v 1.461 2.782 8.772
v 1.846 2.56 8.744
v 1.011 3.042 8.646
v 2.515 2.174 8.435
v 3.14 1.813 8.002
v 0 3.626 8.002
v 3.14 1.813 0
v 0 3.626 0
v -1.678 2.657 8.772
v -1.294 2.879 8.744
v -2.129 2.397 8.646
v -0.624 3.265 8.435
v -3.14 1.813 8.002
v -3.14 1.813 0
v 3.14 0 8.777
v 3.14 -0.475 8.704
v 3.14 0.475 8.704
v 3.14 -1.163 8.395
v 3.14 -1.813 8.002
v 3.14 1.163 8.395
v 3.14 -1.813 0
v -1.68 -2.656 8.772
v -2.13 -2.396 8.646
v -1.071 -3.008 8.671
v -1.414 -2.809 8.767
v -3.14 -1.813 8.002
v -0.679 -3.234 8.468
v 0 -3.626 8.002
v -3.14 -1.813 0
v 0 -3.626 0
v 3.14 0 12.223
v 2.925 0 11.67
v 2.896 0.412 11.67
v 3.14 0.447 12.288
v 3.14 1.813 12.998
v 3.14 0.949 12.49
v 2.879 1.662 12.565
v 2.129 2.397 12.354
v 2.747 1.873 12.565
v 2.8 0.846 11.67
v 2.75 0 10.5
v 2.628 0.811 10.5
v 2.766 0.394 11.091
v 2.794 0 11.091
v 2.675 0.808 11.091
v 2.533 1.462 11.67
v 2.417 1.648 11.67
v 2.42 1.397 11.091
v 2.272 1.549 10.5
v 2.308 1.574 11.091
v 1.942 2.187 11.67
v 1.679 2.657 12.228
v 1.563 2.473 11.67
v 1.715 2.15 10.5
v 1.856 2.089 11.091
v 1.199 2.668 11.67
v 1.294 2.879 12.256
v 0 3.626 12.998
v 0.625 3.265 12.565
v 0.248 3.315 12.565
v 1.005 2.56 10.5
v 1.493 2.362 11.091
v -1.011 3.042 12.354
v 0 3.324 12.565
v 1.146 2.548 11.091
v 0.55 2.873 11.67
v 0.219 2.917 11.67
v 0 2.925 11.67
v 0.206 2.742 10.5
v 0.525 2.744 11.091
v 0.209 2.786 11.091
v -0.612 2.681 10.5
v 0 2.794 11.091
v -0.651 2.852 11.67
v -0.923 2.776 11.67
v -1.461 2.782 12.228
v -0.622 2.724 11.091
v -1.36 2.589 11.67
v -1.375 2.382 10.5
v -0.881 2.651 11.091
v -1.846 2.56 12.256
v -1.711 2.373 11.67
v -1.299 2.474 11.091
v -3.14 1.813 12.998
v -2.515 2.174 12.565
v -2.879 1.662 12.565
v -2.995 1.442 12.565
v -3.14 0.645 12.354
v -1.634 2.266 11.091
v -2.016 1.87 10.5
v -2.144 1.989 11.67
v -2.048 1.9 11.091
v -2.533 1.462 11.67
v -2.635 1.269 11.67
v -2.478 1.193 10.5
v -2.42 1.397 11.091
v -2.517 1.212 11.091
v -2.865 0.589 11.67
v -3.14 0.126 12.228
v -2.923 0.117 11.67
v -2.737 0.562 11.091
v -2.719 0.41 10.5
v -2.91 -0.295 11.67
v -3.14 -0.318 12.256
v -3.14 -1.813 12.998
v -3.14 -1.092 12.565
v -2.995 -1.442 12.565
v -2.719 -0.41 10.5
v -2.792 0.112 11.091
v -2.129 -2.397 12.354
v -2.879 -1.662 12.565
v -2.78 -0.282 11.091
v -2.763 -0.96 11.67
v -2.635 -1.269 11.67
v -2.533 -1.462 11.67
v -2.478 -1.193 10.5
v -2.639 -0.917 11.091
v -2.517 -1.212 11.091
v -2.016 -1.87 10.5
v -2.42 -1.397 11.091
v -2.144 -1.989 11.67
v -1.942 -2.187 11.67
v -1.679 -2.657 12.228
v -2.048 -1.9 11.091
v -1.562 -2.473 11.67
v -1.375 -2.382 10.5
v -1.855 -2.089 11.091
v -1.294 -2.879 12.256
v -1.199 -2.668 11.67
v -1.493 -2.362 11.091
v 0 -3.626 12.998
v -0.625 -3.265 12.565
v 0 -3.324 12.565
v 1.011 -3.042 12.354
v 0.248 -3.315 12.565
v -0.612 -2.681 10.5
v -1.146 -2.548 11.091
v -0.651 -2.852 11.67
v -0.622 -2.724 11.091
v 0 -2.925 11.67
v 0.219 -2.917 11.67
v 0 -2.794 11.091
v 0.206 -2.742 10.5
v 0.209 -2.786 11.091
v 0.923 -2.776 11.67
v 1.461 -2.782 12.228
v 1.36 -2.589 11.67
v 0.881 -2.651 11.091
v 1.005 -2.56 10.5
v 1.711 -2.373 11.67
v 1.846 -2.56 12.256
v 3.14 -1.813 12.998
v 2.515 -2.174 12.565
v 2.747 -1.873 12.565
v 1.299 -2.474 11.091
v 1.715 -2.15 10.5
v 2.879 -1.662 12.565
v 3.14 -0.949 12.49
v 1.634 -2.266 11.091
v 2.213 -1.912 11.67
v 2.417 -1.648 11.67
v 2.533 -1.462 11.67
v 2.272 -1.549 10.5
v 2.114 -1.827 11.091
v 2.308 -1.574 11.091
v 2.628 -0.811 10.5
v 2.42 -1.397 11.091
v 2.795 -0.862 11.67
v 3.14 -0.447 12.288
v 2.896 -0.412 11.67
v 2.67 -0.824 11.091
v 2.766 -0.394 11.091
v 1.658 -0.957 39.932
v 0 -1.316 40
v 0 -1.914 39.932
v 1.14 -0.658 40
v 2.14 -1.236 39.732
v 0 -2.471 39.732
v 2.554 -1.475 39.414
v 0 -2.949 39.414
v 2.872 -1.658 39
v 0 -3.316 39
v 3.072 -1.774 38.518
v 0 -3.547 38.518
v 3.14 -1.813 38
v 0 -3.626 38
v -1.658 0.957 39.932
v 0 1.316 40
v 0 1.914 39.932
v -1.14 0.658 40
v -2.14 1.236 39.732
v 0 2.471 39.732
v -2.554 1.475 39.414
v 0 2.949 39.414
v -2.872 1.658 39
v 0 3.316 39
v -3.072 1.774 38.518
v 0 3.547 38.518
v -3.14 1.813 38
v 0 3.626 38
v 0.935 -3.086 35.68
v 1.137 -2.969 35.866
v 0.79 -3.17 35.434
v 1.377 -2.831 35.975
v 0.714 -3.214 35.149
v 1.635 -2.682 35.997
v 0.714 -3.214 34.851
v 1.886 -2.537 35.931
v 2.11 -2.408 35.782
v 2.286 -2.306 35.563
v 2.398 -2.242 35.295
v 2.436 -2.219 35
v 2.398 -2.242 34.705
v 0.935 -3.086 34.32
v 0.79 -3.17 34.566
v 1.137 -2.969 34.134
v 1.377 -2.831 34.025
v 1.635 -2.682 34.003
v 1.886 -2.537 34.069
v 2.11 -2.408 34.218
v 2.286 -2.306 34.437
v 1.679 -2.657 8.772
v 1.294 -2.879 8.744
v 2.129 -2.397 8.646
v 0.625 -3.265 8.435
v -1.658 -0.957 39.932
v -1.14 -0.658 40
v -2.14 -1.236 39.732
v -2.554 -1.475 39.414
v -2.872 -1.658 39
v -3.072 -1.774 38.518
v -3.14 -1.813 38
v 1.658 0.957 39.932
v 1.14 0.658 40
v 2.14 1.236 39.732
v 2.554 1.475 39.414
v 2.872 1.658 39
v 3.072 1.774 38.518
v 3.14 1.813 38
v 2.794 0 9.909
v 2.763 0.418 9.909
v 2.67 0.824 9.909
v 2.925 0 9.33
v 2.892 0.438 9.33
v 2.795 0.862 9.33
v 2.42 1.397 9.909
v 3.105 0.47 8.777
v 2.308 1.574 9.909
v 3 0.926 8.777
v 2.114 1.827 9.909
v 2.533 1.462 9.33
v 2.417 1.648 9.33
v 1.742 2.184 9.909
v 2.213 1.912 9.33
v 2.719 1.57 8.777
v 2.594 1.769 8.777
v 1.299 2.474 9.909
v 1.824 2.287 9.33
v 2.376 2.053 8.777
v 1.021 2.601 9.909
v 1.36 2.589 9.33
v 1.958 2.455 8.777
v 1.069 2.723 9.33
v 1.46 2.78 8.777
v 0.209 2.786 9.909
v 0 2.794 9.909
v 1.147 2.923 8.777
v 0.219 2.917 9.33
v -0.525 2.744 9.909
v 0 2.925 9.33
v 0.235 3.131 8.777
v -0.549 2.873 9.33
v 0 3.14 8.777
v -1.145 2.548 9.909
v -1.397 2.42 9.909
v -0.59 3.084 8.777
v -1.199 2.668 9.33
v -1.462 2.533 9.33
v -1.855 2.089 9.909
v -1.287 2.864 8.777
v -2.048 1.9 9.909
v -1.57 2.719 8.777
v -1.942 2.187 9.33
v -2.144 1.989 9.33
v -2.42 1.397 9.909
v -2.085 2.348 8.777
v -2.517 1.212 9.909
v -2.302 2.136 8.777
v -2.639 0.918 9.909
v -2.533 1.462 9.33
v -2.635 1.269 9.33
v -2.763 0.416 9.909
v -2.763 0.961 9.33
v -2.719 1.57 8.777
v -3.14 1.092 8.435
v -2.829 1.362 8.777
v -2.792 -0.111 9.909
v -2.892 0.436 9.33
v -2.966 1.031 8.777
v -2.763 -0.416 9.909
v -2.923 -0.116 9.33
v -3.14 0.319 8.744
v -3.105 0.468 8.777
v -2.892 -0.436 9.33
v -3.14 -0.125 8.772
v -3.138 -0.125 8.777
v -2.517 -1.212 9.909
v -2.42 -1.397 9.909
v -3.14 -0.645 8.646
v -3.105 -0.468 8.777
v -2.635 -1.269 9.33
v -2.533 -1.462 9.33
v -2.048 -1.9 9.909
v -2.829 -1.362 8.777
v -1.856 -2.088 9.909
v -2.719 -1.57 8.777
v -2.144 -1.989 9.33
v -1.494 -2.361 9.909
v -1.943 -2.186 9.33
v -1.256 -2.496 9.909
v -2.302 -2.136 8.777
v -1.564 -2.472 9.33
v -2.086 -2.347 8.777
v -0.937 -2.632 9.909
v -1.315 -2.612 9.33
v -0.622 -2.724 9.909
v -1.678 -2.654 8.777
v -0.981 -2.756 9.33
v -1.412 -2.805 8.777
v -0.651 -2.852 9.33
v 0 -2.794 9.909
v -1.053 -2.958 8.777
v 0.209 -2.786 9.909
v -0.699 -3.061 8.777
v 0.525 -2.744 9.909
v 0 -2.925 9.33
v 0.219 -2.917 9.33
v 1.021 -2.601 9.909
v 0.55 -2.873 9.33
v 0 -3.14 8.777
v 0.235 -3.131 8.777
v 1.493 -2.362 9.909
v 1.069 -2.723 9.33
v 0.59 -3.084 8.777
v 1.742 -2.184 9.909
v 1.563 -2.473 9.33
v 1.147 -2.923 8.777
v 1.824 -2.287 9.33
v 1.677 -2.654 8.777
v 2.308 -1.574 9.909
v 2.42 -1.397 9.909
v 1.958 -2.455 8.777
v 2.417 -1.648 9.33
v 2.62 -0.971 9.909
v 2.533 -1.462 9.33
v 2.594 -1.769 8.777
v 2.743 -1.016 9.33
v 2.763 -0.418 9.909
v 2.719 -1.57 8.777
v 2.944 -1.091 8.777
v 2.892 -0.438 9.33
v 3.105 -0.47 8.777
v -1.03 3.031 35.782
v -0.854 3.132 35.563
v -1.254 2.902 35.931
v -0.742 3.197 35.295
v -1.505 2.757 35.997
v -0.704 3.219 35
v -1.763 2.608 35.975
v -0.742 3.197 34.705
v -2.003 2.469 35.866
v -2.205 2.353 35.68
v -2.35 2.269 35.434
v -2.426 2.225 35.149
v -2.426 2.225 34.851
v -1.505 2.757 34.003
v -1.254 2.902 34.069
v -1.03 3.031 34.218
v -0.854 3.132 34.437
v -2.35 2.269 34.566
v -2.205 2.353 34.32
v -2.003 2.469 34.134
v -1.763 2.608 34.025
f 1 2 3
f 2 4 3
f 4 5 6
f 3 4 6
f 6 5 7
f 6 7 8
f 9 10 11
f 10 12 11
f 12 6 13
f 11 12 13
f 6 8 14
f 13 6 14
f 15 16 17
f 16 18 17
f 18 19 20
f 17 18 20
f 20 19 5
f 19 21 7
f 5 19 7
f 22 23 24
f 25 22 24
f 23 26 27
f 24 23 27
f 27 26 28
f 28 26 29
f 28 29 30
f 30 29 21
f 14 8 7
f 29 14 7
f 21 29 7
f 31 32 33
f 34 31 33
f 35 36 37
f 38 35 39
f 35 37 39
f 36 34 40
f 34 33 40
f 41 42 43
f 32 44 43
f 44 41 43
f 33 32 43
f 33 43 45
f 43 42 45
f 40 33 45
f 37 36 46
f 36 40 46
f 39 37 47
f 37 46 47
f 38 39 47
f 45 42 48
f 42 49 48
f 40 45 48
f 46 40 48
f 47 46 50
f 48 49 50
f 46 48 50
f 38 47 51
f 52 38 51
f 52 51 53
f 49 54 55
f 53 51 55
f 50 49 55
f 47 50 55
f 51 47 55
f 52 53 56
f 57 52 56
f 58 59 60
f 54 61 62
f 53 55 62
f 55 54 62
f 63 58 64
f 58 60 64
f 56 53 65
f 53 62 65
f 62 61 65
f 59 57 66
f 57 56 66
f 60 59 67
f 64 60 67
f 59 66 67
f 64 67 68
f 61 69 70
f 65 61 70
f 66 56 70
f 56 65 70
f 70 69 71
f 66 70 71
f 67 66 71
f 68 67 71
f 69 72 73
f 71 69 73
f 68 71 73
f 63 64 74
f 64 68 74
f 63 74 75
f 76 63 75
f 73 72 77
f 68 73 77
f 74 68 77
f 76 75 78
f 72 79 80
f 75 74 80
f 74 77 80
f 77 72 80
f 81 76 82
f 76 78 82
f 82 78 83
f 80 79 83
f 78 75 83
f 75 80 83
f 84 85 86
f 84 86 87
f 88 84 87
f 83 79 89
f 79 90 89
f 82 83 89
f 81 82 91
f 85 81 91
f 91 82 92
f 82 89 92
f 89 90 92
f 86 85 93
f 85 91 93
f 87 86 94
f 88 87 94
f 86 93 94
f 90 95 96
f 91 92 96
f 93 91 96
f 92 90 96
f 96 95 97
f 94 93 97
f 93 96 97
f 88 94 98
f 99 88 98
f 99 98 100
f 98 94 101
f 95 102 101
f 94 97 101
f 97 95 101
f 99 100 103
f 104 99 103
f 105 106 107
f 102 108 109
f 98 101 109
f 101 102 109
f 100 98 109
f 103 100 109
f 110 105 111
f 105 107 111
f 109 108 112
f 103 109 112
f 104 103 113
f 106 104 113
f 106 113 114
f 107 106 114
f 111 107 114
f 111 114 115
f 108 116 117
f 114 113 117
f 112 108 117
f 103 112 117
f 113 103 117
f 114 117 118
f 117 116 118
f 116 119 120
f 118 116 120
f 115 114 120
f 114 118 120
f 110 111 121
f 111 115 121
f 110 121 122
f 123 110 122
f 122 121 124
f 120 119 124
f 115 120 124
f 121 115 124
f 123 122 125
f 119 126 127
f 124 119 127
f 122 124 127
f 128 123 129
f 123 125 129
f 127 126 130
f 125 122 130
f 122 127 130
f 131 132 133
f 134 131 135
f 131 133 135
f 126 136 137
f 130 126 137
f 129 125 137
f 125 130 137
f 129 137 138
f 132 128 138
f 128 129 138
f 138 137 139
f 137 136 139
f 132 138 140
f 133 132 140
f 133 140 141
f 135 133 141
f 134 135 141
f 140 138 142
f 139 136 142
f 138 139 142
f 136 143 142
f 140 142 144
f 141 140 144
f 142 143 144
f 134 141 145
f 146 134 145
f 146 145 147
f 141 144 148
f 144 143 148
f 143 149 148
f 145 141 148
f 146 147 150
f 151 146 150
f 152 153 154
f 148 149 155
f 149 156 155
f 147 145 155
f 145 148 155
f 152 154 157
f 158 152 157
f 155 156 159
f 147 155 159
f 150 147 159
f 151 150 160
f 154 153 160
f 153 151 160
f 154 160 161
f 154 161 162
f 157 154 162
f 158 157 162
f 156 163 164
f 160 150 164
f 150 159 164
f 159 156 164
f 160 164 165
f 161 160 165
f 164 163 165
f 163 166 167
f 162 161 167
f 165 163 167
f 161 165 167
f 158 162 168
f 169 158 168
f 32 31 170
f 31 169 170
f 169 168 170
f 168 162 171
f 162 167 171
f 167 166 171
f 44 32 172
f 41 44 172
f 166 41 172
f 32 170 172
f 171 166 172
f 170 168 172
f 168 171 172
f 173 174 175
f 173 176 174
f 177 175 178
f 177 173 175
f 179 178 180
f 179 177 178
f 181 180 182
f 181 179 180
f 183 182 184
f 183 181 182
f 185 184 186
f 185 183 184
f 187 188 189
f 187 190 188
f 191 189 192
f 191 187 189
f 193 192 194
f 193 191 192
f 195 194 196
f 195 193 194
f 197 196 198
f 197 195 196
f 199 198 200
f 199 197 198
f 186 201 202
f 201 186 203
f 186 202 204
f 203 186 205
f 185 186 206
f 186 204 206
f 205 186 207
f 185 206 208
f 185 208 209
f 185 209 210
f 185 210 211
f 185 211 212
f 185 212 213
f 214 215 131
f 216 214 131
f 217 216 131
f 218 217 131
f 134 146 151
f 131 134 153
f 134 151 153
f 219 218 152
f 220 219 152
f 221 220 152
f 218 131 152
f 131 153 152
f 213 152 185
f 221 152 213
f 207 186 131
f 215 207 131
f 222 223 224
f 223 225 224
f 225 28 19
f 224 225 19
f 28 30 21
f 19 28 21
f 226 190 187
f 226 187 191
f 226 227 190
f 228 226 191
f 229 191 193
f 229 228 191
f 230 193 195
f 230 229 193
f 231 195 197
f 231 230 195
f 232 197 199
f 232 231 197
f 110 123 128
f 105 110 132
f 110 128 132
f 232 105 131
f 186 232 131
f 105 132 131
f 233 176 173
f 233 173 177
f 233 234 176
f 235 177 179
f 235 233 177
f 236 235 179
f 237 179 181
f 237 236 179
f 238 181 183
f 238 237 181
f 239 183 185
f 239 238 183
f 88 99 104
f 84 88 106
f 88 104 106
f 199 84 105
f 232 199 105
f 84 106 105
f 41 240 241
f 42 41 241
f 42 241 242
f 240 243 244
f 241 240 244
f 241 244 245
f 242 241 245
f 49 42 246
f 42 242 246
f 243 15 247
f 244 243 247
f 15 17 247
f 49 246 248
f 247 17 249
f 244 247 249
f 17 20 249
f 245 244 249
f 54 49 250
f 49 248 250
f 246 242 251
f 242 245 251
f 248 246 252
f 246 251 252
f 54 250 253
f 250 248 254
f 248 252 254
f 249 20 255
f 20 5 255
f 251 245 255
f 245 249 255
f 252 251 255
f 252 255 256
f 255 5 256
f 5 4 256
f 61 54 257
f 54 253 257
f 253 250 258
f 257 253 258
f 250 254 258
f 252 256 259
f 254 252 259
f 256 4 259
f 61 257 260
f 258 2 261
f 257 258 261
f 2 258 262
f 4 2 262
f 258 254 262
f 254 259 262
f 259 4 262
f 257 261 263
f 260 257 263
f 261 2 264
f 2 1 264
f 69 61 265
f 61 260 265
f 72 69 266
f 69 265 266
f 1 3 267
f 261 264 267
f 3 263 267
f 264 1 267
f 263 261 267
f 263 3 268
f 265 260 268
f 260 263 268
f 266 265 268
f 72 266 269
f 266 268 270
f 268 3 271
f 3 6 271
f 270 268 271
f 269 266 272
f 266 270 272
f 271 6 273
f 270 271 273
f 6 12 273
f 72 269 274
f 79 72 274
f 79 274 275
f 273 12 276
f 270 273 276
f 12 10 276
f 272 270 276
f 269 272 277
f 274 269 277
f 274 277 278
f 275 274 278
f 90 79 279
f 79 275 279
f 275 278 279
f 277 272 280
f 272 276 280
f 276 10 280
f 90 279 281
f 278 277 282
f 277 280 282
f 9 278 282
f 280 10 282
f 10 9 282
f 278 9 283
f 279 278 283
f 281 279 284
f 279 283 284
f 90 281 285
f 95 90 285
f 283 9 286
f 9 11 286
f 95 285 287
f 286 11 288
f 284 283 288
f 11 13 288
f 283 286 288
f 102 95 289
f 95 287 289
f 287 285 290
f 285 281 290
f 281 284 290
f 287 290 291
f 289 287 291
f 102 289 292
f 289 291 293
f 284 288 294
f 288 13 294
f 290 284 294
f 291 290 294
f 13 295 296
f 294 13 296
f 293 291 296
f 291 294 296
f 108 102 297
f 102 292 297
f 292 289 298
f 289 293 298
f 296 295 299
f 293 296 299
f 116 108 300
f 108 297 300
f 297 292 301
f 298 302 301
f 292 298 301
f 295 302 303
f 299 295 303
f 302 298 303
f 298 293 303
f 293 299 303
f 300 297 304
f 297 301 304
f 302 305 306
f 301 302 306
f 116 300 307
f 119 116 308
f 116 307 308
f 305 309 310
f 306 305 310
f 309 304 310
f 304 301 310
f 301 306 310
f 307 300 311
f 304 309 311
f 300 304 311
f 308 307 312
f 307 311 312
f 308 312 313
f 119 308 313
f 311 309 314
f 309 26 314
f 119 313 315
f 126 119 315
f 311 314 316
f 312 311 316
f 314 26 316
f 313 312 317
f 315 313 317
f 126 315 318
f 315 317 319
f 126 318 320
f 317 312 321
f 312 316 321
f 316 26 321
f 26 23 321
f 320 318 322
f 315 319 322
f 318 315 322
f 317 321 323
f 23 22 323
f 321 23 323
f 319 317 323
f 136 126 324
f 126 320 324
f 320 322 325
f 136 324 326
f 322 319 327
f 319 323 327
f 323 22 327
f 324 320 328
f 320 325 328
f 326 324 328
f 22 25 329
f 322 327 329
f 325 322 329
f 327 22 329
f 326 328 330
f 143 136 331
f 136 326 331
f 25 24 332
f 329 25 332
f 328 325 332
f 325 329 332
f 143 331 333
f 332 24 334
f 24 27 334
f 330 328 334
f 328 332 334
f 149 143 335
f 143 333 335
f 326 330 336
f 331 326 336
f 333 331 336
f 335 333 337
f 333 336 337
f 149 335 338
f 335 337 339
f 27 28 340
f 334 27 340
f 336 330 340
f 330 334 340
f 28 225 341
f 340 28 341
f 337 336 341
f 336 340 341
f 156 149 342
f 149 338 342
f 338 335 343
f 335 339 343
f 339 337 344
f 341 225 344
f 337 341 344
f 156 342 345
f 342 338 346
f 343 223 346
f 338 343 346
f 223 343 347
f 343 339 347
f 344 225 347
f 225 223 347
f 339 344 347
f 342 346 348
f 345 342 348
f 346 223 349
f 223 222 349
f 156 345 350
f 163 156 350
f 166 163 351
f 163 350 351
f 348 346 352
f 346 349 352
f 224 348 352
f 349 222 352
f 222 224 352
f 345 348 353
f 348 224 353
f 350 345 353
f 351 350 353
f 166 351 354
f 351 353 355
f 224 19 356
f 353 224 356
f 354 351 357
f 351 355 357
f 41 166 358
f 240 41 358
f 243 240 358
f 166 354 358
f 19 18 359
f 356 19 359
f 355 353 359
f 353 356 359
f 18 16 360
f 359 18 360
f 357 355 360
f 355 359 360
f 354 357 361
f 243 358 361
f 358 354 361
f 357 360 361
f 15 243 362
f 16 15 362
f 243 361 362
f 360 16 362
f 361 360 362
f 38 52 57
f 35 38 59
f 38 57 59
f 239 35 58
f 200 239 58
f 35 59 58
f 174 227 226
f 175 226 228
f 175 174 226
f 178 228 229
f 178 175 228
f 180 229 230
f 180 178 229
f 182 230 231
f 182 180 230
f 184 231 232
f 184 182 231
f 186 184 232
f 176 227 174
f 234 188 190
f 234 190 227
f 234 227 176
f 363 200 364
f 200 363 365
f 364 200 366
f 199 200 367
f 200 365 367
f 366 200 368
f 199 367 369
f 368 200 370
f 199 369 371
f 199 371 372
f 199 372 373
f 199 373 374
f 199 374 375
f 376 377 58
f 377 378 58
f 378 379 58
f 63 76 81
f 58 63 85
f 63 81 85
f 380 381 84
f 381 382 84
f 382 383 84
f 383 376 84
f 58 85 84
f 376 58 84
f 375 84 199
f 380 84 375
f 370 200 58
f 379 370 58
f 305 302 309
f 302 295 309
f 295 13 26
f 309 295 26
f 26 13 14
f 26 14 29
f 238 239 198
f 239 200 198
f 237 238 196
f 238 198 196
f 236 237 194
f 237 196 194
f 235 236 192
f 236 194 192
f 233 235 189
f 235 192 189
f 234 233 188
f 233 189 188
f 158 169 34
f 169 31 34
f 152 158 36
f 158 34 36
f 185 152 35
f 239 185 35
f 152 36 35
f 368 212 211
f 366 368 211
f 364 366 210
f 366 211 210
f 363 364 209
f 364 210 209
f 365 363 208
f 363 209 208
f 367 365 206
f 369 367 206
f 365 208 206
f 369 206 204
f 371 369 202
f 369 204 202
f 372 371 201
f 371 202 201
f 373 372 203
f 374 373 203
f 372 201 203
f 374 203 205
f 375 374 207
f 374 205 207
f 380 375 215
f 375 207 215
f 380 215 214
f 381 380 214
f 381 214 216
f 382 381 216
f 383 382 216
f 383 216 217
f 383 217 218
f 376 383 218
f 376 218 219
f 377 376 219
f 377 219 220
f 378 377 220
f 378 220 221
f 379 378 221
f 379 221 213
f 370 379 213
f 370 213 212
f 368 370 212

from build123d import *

# Parameters (mm, degrees)
F1_DEPTH = 40
F2_R     = 1
F3_DEPTH = 7.851
F6_R     = 4
F8_R     = 2


with BuildPart() as f1:
    # F0 (on Top) → F1 (new body)
    with BuildSketch(Plane.XY):
        Polygon((0, 3.62576), (-3.14, 1.81288), (-3.14, -1.81288), (0, -3.62576), (3.14, -1.81288), (3.14, 1.81288), align=None)
    extrude(amount=F1_DEPTH)

    # F2 (on face) → F3 (cut, through all)
    with BuildSketch(Plane(origin=(1.57, -2.71932, 0), x_dir=(0.866025, 0.5, 0), z_dir=(0.5, -0.866025, 0))):
        with Locations((0, 35)):
            Circle(F2_R)
    extrude(amount=-F3_DEPTH, mode=Mode.SUBTRACT)

    # F7: sweep along a path in F5
    with BuildLine(Plane.XY.offset(10.5)) as f7_path:
        CenterArc((0, 0), 6.75, 0, 360)
    # F6 (on Front) → F7 (sweep, cut)
    with BuildSketch(Plane.XZ):
        with Locations((-6.75, 10.5)):
            Circle(F6_R)
    sweep(path=f7_path.line, mode=Mode.SUBTRACT)

    # F8
    f8_edges = [f1.edges().sort_by_distance(p)[0] for p in [
        (1.57, -2.71932, 40),
        (-1.57, -2.71932, 40),
        (3.14, 0, 40),
        (-1.57, 2.71932, 40),
        (-3.14, 0, 40),
        (1.57, 2.71932, 40),
    ]]
    fillet(f8_edges, radius=F8_R)


solid = f1.part
